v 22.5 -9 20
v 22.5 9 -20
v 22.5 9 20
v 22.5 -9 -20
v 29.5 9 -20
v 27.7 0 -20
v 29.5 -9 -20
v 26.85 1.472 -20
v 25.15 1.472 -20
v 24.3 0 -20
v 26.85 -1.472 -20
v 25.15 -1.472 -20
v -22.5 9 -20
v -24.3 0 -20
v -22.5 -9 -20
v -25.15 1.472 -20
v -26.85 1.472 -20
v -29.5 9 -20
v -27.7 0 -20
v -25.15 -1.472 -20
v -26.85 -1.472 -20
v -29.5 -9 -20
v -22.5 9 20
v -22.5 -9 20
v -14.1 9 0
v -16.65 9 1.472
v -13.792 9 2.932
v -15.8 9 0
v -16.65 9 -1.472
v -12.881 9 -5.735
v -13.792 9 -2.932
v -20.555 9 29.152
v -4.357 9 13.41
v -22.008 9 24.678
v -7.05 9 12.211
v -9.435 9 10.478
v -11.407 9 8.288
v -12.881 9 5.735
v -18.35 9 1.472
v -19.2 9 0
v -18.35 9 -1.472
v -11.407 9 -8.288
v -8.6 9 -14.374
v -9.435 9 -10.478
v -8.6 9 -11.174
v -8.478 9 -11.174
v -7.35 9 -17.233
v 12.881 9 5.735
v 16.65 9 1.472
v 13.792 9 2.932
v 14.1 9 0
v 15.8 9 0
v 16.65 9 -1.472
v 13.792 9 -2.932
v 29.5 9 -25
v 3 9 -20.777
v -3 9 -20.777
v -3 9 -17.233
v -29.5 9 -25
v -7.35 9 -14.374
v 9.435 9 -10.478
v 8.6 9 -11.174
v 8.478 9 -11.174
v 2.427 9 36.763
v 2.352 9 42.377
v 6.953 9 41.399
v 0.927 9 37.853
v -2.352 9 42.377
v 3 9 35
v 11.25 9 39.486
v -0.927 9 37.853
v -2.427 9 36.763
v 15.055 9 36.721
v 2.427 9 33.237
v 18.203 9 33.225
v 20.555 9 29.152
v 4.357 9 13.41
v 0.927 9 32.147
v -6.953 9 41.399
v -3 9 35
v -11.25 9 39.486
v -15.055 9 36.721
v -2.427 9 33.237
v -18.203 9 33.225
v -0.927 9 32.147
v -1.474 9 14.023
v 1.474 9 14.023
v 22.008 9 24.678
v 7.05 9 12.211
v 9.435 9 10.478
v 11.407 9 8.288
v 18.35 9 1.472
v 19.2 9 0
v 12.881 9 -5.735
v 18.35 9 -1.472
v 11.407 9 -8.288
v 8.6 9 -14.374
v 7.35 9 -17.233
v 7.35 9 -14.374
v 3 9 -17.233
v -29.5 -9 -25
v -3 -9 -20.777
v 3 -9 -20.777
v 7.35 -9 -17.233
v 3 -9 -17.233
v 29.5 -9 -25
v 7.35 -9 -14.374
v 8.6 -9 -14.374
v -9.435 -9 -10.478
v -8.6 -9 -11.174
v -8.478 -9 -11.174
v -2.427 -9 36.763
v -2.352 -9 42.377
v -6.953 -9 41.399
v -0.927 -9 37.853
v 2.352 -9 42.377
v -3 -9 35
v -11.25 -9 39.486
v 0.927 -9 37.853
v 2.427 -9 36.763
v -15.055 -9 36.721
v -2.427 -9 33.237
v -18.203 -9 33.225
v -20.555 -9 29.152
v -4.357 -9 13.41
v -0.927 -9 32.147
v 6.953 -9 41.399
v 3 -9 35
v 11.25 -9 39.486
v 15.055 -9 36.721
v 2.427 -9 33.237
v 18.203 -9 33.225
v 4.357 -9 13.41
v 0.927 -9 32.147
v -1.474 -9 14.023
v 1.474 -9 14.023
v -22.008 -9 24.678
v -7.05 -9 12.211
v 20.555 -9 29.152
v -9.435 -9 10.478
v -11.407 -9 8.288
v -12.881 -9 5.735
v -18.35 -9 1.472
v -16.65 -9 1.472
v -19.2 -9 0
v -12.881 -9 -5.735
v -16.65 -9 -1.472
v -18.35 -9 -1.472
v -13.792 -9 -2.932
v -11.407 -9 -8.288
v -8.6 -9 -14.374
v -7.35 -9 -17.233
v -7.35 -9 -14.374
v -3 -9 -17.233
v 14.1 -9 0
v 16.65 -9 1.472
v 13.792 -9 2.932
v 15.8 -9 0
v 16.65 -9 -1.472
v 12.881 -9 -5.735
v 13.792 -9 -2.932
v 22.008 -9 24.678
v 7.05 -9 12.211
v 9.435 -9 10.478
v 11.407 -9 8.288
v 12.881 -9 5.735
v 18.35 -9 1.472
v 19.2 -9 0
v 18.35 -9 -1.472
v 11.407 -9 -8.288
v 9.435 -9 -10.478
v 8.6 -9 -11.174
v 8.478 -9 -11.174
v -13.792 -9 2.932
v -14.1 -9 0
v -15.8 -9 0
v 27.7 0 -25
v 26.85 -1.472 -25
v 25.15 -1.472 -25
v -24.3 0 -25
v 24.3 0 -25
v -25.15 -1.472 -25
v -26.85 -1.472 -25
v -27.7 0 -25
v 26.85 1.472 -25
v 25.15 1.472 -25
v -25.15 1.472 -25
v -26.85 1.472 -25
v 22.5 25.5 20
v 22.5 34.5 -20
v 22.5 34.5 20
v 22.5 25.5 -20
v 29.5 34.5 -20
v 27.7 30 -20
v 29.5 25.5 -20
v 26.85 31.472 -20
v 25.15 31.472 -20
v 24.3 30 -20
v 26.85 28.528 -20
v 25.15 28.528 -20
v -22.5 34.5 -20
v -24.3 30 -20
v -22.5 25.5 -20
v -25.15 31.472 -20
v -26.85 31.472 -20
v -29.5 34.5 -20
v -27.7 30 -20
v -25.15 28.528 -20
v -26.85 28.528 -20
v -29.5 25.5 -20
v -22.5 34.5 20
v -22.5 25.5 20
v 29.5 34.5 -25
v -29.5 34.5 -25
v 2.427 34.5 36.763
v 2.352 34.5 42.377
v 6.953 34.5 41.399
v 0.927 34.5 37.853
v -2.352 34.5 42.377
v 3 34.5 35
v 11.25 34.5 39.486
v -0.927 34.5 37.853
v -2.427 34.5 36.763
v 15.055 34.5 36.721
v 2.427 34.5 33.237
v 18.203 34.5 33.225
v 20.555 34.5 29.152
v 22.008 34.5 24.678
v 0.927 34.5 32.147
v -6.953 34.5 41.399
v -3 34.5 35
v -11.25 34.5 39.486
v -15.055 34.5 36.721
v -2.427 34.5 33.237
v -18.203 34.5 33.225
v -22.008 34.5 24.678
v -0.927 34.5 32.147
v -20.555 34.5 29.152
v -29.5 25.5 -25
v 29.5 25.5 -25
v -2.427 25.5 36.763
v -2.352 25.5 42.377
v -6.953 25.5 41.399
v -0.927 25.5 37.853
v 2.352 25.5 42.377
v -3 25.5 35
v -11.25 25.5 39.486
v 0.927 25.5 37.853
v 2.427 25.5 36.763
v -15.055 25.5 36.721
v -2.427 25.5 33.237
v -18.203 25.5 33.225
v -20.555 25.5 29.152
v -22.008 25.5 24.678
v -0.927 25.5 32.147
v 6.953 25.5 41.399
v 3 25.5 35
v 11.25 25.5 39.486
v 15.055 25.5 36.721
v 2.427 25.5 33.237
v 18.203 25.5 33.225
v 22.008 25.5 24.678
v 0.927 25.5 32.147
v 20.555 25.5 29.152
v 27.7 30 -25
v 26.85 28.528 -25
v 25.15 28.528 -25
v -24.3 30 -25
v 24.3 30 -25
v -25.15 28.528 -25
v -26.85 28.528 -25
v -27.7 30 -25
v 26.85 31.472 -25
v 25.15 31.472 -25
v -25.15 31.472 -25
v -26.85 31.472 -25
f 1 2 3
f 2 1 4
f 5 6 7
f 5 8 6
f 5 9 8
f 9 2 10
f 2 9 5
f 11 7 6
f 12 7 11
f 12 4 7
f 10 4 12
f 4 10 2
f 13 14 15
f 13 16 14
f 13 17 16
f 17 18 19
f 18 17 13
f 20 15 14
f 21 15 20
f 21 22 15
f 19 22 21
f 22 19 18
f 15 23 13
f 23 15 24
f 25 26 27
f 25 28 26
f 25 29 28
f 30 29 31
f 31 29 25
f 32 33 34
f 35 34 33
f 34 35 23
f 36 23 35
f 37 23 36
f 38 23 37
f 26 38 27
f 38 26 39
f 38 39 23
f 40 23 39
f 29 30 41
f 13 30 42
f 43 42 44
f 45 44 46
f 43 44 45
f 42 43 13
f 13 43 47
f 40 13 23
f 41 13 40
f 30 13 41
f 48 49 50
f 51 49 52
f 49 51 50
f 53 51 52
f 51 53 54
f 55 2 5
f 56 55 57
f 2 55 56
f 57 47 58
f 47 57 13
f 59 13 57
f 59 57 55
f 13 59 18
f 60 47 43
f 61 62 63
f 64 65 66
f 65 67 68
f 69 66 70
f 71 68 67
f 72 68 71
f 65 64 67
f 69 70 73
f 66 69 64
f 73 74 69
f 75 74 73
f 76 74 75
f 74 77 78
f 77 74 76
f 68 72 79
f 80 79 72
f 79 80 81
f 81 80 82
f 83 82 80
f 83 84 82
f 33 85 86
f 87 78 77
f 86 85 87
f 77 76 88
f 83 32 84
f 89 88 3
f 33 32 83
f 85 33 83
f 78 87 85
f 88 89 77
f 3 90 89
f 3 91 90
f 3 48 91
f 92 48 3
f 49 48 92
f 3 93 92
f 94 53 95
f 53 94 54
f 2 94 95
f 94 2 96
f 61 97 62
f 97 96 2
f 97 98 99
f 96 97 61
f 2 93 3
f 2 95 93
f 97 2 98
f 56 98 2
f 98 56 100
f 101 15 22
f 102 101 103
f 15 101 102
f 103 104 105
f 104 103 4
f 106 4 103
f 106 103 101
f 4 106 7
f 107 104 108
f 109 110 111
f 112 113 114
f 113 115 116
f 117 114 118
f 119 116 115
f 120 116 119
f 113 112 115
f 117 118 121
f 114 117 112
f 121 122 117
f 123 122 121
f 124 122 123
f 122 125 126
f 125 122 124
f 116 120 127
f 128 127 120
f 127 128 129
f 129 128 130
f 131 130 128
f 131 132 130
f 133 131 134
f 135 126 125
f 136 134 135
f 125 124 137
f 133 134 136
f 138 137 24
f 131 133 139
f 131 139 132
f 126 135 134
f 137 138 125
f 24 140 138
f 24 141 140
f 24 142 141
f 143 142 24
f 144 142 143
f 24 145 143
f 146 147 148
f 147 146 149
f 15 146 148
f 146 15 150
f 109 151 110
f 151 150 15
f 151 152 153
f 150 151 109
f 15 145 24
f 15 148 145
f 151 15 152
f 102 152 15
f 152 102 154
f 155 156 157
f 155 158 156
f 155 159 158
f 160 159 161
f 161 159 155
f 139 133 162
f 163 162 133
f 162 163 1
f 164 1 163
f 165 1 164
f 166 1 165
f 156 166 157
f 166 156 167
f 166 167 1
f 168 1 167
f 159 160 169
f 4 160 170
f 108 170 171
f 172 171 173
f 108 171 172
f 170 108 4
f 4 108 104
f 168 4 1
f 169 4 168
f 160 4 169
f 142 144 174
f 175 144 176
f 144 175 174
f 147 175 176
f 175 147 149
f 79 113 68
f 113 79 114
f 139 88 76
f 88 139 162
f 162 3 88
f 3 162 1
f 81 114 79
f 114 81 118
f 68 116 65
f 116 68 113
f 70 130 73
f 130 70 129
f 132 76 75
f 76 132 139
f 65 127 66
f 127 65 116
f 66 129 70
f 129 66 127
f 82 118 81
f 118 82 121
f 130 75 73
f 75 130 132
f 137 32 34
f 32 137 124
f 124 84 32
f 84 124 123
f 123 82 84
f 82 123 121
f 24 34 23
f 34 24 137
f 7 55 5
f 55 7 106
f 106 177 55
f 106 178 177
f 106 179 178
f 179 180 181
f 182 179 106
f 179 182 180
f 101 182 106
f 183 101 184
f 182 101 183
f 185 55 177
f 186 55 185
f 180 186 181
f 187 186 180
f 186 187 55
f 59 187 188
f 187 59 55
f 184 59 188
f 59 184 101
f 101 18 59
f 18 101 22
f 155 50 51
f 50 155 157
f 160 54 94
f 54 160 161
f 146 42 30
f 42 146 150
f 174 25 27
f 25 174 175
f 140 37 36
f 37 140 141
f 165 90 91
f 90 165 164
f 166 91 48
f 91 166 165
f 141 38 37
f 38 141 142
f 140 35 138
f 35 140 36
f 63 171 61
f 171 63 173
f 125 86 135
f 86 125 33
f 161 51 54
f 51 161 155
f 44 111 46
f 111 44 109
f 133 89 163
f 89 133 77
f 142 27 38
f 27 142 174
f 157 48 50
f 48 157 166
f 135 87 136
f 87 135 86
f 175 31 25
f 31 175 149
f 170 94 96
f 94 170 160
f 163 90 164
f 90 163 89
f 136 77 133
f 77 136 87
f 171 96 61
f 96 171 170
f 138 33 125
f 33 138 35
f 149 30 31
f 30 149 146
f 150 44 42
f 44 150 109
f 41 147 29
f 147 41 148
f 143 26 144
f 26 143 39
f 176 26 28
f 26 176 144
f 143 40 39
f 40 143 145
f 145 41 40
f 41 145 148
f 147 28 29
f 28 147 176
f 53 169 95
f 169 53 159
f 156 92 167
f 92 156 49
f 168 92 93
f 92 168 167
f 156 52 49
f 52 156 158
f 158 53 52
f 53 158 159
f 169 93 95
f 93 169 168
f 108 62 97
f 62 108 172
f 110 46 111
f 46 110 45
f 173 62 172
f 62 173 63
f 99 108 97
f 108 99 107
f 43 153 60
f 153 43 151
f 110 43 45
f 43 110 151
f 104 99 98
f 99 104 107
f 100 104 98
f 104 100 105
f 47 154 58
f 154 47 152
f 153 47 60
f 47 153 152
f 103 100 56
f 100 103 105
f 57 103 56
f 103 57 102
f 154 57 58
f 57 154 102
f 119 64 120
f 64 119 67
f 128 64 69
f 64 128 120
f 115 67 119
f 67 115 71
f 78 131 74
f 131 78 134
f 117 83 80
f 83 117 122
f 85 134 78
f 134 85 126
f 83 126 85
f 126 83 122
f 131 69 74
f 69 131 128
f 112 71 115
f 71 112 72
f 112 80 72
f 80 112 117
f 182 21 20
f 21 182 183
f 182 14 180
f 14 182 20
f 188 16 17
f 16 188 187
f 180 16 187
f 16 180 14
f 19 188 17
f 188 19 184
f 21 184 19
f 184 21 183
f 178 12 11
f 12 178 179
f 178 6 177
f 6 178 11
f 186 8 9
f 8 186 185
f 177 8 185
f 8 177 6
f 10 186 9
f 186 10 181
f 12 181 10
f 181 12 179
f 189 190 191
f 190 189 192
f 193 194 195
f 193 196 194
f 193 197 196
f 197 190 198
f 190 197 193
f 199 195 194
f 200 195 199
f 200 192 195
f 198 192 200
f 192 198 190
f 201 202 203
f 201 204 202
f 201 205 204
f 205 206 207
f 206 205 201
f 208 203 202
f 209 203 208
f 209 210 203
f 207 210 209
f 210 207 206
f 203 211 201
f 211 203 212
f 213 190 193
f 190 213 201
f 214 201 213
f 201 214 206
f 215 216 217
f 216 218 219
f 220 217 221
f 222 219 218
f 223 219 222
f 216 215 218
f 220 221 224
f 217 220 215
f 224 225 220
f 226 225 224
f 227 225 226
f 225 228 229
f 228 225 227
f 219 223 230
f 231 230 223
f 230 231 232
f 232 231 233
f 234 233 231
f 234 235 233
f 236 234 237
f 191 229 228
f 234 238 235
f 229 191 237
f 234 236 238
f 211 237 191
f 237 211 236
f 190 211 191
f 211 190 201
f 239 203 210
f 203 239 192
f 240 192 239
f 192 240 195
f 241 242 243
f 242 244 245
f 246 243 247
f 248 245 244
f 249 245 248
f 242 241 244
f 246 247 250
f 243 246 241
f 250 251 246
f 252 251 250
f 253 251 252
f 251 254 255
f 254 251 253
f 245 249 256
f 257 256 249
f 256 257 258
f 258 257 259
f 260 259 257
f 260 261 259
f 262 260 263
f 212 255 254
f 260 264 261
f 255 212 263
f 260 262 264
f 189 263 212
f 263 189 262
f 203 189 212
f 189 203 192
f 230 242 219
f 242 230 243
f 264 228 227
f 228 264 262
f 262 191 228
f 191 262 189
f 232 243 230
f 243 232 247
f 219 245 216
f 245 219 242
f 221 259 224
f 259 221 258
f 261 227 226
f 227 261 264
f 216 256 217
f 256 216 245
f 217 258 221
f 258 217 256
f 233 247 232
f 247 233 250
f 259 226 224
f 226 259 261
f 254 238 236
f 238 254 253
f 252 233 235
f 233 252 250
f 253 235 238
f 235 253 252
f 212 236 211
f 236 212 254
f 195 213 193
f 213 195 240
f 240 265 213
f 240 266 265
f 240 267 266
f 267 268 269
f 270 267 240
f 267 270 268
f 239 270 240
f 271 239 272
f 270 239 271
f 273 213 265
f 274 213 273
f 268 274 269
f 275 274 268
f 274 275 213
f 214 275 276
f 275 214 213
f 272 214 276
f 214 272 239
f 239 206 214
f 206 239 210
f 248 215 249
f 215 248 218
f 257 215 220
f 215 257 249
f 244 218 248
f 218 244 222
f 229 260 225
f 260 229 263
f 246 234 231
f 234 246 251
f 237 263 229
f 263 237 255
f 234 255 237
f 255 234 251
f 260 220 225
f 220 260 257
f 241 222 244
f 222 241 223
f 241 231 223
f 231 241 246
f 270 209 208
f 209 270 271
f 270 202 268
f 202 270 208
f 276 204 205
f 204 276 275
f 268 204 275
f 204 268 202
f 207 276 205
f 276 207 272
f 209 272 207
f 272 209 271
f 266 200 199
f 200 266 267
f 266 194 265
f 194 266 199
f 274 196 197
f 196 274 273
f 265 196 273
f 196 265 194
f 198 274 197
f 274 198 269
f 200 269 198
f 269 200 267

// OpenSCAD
module block(motor){ 
    // Dimensiones exteriores del montaje
    W = 45;     // Ancho (en direccion X)    
    H = 40;     // Alto (en direccion Z)
    L = motor ? 18 : 9; // Ancho (en direccion Y)
    ww = 14;    // Sobresaliente ajuste de pieza
    hh = 5;     // Altura base

    Rs = 3;     // Radio del eje de accionamiento
    es = 15;    // Excentricidad respecto de la seccion semicircular

    // Dimensiones del motor
    Rm = 14+0.1;    // Radio del motor
    r2 = 1.7;       // Radio de los agujeros para tornillos
    d2 = 35;        // Separacion entre los tornillos

    // Espacio para soporte de cables
    wc1 = 3+0.2;    // Largo parte ancha
    lc1 = 17+0.2;   // Ancho parte ancha
    xc1 = sqrt(Rm*Rm-lc1*lc1/4)+wc1/2; // Posicion del centro del cuadrado
    wc2 = 5+0.2;    // Largo parte angosta
    lc2 = 14.5+0.2; // Ancho parte angosta
    xc2 = sqrt(Rm*Rm-lc2*lc2/4)+wc2/2; // Posicion del centro del cuadrado
    wc3 = 7;        // Largo parte angosta
    lc3 = 6;        // Ancho parte angosta
    xc3 = sqrt(Rm*Rm-lc3*lc3/4)+wc3/2; // Posicion del centro del cuadrado

    difference(){ 
        union(){
            cube([W,L,H],center = true); // Envolvente        
            
            // Semicirculo superior
            translate([0,0,H/2])
            rotate([90,0,0])
                cylinder(r = W/2, h = L, center = true);    
            
            // Base
            translate([0,0,-H/2-hh/2])
                cube([W+ww,L,hh],center = true); 
        }
        
        // Orificio para el eje de accionamiento
        translate([0,0,H/2+es])
        rotate([90,0,0])
            cylinder(r = Rs, h = L, center = true);    
        
        // Hueco para el motor
        if(motor){
            rotate([90,0,0])
                cylinder(r = Rm, h = L+0.2, center = true);
               
            // Orificios para los tornillos del motor        
            translate([-d2/2,0,0])
            rotate([90,0,0])
                cylinder(r = r2, h = L, center = true);    
            translate([d2/2,0,0])
            rotate([90,0,0])
                cylinder(r = r2, h = L, center = true);
            
            // Espacio para los conectores del motor
            translate([0,0,-xc1])
                cube([lc1,L,wc1], center = true);
            translate([0,0,-xc2])
                cube([lc2,L,wc2], center = true);
            translate([0,0,-xc3])
                cube([lc3,L,wc3], center = true);    
        }
        
        // Orificions para tornillos de ajuste de la base
        translate([-W/2-ww/4,0,-H/2-hh/2])
            cylinder(r = r2, h = hh, center = true);    
        translate([W/2+ww/4,0,-H/2-hh/2])
            cylinder(r = r2, h = hh, center = true);
    }
}

//$fn = 250;
block(true);
translate([0,30,0])
    block(false);
